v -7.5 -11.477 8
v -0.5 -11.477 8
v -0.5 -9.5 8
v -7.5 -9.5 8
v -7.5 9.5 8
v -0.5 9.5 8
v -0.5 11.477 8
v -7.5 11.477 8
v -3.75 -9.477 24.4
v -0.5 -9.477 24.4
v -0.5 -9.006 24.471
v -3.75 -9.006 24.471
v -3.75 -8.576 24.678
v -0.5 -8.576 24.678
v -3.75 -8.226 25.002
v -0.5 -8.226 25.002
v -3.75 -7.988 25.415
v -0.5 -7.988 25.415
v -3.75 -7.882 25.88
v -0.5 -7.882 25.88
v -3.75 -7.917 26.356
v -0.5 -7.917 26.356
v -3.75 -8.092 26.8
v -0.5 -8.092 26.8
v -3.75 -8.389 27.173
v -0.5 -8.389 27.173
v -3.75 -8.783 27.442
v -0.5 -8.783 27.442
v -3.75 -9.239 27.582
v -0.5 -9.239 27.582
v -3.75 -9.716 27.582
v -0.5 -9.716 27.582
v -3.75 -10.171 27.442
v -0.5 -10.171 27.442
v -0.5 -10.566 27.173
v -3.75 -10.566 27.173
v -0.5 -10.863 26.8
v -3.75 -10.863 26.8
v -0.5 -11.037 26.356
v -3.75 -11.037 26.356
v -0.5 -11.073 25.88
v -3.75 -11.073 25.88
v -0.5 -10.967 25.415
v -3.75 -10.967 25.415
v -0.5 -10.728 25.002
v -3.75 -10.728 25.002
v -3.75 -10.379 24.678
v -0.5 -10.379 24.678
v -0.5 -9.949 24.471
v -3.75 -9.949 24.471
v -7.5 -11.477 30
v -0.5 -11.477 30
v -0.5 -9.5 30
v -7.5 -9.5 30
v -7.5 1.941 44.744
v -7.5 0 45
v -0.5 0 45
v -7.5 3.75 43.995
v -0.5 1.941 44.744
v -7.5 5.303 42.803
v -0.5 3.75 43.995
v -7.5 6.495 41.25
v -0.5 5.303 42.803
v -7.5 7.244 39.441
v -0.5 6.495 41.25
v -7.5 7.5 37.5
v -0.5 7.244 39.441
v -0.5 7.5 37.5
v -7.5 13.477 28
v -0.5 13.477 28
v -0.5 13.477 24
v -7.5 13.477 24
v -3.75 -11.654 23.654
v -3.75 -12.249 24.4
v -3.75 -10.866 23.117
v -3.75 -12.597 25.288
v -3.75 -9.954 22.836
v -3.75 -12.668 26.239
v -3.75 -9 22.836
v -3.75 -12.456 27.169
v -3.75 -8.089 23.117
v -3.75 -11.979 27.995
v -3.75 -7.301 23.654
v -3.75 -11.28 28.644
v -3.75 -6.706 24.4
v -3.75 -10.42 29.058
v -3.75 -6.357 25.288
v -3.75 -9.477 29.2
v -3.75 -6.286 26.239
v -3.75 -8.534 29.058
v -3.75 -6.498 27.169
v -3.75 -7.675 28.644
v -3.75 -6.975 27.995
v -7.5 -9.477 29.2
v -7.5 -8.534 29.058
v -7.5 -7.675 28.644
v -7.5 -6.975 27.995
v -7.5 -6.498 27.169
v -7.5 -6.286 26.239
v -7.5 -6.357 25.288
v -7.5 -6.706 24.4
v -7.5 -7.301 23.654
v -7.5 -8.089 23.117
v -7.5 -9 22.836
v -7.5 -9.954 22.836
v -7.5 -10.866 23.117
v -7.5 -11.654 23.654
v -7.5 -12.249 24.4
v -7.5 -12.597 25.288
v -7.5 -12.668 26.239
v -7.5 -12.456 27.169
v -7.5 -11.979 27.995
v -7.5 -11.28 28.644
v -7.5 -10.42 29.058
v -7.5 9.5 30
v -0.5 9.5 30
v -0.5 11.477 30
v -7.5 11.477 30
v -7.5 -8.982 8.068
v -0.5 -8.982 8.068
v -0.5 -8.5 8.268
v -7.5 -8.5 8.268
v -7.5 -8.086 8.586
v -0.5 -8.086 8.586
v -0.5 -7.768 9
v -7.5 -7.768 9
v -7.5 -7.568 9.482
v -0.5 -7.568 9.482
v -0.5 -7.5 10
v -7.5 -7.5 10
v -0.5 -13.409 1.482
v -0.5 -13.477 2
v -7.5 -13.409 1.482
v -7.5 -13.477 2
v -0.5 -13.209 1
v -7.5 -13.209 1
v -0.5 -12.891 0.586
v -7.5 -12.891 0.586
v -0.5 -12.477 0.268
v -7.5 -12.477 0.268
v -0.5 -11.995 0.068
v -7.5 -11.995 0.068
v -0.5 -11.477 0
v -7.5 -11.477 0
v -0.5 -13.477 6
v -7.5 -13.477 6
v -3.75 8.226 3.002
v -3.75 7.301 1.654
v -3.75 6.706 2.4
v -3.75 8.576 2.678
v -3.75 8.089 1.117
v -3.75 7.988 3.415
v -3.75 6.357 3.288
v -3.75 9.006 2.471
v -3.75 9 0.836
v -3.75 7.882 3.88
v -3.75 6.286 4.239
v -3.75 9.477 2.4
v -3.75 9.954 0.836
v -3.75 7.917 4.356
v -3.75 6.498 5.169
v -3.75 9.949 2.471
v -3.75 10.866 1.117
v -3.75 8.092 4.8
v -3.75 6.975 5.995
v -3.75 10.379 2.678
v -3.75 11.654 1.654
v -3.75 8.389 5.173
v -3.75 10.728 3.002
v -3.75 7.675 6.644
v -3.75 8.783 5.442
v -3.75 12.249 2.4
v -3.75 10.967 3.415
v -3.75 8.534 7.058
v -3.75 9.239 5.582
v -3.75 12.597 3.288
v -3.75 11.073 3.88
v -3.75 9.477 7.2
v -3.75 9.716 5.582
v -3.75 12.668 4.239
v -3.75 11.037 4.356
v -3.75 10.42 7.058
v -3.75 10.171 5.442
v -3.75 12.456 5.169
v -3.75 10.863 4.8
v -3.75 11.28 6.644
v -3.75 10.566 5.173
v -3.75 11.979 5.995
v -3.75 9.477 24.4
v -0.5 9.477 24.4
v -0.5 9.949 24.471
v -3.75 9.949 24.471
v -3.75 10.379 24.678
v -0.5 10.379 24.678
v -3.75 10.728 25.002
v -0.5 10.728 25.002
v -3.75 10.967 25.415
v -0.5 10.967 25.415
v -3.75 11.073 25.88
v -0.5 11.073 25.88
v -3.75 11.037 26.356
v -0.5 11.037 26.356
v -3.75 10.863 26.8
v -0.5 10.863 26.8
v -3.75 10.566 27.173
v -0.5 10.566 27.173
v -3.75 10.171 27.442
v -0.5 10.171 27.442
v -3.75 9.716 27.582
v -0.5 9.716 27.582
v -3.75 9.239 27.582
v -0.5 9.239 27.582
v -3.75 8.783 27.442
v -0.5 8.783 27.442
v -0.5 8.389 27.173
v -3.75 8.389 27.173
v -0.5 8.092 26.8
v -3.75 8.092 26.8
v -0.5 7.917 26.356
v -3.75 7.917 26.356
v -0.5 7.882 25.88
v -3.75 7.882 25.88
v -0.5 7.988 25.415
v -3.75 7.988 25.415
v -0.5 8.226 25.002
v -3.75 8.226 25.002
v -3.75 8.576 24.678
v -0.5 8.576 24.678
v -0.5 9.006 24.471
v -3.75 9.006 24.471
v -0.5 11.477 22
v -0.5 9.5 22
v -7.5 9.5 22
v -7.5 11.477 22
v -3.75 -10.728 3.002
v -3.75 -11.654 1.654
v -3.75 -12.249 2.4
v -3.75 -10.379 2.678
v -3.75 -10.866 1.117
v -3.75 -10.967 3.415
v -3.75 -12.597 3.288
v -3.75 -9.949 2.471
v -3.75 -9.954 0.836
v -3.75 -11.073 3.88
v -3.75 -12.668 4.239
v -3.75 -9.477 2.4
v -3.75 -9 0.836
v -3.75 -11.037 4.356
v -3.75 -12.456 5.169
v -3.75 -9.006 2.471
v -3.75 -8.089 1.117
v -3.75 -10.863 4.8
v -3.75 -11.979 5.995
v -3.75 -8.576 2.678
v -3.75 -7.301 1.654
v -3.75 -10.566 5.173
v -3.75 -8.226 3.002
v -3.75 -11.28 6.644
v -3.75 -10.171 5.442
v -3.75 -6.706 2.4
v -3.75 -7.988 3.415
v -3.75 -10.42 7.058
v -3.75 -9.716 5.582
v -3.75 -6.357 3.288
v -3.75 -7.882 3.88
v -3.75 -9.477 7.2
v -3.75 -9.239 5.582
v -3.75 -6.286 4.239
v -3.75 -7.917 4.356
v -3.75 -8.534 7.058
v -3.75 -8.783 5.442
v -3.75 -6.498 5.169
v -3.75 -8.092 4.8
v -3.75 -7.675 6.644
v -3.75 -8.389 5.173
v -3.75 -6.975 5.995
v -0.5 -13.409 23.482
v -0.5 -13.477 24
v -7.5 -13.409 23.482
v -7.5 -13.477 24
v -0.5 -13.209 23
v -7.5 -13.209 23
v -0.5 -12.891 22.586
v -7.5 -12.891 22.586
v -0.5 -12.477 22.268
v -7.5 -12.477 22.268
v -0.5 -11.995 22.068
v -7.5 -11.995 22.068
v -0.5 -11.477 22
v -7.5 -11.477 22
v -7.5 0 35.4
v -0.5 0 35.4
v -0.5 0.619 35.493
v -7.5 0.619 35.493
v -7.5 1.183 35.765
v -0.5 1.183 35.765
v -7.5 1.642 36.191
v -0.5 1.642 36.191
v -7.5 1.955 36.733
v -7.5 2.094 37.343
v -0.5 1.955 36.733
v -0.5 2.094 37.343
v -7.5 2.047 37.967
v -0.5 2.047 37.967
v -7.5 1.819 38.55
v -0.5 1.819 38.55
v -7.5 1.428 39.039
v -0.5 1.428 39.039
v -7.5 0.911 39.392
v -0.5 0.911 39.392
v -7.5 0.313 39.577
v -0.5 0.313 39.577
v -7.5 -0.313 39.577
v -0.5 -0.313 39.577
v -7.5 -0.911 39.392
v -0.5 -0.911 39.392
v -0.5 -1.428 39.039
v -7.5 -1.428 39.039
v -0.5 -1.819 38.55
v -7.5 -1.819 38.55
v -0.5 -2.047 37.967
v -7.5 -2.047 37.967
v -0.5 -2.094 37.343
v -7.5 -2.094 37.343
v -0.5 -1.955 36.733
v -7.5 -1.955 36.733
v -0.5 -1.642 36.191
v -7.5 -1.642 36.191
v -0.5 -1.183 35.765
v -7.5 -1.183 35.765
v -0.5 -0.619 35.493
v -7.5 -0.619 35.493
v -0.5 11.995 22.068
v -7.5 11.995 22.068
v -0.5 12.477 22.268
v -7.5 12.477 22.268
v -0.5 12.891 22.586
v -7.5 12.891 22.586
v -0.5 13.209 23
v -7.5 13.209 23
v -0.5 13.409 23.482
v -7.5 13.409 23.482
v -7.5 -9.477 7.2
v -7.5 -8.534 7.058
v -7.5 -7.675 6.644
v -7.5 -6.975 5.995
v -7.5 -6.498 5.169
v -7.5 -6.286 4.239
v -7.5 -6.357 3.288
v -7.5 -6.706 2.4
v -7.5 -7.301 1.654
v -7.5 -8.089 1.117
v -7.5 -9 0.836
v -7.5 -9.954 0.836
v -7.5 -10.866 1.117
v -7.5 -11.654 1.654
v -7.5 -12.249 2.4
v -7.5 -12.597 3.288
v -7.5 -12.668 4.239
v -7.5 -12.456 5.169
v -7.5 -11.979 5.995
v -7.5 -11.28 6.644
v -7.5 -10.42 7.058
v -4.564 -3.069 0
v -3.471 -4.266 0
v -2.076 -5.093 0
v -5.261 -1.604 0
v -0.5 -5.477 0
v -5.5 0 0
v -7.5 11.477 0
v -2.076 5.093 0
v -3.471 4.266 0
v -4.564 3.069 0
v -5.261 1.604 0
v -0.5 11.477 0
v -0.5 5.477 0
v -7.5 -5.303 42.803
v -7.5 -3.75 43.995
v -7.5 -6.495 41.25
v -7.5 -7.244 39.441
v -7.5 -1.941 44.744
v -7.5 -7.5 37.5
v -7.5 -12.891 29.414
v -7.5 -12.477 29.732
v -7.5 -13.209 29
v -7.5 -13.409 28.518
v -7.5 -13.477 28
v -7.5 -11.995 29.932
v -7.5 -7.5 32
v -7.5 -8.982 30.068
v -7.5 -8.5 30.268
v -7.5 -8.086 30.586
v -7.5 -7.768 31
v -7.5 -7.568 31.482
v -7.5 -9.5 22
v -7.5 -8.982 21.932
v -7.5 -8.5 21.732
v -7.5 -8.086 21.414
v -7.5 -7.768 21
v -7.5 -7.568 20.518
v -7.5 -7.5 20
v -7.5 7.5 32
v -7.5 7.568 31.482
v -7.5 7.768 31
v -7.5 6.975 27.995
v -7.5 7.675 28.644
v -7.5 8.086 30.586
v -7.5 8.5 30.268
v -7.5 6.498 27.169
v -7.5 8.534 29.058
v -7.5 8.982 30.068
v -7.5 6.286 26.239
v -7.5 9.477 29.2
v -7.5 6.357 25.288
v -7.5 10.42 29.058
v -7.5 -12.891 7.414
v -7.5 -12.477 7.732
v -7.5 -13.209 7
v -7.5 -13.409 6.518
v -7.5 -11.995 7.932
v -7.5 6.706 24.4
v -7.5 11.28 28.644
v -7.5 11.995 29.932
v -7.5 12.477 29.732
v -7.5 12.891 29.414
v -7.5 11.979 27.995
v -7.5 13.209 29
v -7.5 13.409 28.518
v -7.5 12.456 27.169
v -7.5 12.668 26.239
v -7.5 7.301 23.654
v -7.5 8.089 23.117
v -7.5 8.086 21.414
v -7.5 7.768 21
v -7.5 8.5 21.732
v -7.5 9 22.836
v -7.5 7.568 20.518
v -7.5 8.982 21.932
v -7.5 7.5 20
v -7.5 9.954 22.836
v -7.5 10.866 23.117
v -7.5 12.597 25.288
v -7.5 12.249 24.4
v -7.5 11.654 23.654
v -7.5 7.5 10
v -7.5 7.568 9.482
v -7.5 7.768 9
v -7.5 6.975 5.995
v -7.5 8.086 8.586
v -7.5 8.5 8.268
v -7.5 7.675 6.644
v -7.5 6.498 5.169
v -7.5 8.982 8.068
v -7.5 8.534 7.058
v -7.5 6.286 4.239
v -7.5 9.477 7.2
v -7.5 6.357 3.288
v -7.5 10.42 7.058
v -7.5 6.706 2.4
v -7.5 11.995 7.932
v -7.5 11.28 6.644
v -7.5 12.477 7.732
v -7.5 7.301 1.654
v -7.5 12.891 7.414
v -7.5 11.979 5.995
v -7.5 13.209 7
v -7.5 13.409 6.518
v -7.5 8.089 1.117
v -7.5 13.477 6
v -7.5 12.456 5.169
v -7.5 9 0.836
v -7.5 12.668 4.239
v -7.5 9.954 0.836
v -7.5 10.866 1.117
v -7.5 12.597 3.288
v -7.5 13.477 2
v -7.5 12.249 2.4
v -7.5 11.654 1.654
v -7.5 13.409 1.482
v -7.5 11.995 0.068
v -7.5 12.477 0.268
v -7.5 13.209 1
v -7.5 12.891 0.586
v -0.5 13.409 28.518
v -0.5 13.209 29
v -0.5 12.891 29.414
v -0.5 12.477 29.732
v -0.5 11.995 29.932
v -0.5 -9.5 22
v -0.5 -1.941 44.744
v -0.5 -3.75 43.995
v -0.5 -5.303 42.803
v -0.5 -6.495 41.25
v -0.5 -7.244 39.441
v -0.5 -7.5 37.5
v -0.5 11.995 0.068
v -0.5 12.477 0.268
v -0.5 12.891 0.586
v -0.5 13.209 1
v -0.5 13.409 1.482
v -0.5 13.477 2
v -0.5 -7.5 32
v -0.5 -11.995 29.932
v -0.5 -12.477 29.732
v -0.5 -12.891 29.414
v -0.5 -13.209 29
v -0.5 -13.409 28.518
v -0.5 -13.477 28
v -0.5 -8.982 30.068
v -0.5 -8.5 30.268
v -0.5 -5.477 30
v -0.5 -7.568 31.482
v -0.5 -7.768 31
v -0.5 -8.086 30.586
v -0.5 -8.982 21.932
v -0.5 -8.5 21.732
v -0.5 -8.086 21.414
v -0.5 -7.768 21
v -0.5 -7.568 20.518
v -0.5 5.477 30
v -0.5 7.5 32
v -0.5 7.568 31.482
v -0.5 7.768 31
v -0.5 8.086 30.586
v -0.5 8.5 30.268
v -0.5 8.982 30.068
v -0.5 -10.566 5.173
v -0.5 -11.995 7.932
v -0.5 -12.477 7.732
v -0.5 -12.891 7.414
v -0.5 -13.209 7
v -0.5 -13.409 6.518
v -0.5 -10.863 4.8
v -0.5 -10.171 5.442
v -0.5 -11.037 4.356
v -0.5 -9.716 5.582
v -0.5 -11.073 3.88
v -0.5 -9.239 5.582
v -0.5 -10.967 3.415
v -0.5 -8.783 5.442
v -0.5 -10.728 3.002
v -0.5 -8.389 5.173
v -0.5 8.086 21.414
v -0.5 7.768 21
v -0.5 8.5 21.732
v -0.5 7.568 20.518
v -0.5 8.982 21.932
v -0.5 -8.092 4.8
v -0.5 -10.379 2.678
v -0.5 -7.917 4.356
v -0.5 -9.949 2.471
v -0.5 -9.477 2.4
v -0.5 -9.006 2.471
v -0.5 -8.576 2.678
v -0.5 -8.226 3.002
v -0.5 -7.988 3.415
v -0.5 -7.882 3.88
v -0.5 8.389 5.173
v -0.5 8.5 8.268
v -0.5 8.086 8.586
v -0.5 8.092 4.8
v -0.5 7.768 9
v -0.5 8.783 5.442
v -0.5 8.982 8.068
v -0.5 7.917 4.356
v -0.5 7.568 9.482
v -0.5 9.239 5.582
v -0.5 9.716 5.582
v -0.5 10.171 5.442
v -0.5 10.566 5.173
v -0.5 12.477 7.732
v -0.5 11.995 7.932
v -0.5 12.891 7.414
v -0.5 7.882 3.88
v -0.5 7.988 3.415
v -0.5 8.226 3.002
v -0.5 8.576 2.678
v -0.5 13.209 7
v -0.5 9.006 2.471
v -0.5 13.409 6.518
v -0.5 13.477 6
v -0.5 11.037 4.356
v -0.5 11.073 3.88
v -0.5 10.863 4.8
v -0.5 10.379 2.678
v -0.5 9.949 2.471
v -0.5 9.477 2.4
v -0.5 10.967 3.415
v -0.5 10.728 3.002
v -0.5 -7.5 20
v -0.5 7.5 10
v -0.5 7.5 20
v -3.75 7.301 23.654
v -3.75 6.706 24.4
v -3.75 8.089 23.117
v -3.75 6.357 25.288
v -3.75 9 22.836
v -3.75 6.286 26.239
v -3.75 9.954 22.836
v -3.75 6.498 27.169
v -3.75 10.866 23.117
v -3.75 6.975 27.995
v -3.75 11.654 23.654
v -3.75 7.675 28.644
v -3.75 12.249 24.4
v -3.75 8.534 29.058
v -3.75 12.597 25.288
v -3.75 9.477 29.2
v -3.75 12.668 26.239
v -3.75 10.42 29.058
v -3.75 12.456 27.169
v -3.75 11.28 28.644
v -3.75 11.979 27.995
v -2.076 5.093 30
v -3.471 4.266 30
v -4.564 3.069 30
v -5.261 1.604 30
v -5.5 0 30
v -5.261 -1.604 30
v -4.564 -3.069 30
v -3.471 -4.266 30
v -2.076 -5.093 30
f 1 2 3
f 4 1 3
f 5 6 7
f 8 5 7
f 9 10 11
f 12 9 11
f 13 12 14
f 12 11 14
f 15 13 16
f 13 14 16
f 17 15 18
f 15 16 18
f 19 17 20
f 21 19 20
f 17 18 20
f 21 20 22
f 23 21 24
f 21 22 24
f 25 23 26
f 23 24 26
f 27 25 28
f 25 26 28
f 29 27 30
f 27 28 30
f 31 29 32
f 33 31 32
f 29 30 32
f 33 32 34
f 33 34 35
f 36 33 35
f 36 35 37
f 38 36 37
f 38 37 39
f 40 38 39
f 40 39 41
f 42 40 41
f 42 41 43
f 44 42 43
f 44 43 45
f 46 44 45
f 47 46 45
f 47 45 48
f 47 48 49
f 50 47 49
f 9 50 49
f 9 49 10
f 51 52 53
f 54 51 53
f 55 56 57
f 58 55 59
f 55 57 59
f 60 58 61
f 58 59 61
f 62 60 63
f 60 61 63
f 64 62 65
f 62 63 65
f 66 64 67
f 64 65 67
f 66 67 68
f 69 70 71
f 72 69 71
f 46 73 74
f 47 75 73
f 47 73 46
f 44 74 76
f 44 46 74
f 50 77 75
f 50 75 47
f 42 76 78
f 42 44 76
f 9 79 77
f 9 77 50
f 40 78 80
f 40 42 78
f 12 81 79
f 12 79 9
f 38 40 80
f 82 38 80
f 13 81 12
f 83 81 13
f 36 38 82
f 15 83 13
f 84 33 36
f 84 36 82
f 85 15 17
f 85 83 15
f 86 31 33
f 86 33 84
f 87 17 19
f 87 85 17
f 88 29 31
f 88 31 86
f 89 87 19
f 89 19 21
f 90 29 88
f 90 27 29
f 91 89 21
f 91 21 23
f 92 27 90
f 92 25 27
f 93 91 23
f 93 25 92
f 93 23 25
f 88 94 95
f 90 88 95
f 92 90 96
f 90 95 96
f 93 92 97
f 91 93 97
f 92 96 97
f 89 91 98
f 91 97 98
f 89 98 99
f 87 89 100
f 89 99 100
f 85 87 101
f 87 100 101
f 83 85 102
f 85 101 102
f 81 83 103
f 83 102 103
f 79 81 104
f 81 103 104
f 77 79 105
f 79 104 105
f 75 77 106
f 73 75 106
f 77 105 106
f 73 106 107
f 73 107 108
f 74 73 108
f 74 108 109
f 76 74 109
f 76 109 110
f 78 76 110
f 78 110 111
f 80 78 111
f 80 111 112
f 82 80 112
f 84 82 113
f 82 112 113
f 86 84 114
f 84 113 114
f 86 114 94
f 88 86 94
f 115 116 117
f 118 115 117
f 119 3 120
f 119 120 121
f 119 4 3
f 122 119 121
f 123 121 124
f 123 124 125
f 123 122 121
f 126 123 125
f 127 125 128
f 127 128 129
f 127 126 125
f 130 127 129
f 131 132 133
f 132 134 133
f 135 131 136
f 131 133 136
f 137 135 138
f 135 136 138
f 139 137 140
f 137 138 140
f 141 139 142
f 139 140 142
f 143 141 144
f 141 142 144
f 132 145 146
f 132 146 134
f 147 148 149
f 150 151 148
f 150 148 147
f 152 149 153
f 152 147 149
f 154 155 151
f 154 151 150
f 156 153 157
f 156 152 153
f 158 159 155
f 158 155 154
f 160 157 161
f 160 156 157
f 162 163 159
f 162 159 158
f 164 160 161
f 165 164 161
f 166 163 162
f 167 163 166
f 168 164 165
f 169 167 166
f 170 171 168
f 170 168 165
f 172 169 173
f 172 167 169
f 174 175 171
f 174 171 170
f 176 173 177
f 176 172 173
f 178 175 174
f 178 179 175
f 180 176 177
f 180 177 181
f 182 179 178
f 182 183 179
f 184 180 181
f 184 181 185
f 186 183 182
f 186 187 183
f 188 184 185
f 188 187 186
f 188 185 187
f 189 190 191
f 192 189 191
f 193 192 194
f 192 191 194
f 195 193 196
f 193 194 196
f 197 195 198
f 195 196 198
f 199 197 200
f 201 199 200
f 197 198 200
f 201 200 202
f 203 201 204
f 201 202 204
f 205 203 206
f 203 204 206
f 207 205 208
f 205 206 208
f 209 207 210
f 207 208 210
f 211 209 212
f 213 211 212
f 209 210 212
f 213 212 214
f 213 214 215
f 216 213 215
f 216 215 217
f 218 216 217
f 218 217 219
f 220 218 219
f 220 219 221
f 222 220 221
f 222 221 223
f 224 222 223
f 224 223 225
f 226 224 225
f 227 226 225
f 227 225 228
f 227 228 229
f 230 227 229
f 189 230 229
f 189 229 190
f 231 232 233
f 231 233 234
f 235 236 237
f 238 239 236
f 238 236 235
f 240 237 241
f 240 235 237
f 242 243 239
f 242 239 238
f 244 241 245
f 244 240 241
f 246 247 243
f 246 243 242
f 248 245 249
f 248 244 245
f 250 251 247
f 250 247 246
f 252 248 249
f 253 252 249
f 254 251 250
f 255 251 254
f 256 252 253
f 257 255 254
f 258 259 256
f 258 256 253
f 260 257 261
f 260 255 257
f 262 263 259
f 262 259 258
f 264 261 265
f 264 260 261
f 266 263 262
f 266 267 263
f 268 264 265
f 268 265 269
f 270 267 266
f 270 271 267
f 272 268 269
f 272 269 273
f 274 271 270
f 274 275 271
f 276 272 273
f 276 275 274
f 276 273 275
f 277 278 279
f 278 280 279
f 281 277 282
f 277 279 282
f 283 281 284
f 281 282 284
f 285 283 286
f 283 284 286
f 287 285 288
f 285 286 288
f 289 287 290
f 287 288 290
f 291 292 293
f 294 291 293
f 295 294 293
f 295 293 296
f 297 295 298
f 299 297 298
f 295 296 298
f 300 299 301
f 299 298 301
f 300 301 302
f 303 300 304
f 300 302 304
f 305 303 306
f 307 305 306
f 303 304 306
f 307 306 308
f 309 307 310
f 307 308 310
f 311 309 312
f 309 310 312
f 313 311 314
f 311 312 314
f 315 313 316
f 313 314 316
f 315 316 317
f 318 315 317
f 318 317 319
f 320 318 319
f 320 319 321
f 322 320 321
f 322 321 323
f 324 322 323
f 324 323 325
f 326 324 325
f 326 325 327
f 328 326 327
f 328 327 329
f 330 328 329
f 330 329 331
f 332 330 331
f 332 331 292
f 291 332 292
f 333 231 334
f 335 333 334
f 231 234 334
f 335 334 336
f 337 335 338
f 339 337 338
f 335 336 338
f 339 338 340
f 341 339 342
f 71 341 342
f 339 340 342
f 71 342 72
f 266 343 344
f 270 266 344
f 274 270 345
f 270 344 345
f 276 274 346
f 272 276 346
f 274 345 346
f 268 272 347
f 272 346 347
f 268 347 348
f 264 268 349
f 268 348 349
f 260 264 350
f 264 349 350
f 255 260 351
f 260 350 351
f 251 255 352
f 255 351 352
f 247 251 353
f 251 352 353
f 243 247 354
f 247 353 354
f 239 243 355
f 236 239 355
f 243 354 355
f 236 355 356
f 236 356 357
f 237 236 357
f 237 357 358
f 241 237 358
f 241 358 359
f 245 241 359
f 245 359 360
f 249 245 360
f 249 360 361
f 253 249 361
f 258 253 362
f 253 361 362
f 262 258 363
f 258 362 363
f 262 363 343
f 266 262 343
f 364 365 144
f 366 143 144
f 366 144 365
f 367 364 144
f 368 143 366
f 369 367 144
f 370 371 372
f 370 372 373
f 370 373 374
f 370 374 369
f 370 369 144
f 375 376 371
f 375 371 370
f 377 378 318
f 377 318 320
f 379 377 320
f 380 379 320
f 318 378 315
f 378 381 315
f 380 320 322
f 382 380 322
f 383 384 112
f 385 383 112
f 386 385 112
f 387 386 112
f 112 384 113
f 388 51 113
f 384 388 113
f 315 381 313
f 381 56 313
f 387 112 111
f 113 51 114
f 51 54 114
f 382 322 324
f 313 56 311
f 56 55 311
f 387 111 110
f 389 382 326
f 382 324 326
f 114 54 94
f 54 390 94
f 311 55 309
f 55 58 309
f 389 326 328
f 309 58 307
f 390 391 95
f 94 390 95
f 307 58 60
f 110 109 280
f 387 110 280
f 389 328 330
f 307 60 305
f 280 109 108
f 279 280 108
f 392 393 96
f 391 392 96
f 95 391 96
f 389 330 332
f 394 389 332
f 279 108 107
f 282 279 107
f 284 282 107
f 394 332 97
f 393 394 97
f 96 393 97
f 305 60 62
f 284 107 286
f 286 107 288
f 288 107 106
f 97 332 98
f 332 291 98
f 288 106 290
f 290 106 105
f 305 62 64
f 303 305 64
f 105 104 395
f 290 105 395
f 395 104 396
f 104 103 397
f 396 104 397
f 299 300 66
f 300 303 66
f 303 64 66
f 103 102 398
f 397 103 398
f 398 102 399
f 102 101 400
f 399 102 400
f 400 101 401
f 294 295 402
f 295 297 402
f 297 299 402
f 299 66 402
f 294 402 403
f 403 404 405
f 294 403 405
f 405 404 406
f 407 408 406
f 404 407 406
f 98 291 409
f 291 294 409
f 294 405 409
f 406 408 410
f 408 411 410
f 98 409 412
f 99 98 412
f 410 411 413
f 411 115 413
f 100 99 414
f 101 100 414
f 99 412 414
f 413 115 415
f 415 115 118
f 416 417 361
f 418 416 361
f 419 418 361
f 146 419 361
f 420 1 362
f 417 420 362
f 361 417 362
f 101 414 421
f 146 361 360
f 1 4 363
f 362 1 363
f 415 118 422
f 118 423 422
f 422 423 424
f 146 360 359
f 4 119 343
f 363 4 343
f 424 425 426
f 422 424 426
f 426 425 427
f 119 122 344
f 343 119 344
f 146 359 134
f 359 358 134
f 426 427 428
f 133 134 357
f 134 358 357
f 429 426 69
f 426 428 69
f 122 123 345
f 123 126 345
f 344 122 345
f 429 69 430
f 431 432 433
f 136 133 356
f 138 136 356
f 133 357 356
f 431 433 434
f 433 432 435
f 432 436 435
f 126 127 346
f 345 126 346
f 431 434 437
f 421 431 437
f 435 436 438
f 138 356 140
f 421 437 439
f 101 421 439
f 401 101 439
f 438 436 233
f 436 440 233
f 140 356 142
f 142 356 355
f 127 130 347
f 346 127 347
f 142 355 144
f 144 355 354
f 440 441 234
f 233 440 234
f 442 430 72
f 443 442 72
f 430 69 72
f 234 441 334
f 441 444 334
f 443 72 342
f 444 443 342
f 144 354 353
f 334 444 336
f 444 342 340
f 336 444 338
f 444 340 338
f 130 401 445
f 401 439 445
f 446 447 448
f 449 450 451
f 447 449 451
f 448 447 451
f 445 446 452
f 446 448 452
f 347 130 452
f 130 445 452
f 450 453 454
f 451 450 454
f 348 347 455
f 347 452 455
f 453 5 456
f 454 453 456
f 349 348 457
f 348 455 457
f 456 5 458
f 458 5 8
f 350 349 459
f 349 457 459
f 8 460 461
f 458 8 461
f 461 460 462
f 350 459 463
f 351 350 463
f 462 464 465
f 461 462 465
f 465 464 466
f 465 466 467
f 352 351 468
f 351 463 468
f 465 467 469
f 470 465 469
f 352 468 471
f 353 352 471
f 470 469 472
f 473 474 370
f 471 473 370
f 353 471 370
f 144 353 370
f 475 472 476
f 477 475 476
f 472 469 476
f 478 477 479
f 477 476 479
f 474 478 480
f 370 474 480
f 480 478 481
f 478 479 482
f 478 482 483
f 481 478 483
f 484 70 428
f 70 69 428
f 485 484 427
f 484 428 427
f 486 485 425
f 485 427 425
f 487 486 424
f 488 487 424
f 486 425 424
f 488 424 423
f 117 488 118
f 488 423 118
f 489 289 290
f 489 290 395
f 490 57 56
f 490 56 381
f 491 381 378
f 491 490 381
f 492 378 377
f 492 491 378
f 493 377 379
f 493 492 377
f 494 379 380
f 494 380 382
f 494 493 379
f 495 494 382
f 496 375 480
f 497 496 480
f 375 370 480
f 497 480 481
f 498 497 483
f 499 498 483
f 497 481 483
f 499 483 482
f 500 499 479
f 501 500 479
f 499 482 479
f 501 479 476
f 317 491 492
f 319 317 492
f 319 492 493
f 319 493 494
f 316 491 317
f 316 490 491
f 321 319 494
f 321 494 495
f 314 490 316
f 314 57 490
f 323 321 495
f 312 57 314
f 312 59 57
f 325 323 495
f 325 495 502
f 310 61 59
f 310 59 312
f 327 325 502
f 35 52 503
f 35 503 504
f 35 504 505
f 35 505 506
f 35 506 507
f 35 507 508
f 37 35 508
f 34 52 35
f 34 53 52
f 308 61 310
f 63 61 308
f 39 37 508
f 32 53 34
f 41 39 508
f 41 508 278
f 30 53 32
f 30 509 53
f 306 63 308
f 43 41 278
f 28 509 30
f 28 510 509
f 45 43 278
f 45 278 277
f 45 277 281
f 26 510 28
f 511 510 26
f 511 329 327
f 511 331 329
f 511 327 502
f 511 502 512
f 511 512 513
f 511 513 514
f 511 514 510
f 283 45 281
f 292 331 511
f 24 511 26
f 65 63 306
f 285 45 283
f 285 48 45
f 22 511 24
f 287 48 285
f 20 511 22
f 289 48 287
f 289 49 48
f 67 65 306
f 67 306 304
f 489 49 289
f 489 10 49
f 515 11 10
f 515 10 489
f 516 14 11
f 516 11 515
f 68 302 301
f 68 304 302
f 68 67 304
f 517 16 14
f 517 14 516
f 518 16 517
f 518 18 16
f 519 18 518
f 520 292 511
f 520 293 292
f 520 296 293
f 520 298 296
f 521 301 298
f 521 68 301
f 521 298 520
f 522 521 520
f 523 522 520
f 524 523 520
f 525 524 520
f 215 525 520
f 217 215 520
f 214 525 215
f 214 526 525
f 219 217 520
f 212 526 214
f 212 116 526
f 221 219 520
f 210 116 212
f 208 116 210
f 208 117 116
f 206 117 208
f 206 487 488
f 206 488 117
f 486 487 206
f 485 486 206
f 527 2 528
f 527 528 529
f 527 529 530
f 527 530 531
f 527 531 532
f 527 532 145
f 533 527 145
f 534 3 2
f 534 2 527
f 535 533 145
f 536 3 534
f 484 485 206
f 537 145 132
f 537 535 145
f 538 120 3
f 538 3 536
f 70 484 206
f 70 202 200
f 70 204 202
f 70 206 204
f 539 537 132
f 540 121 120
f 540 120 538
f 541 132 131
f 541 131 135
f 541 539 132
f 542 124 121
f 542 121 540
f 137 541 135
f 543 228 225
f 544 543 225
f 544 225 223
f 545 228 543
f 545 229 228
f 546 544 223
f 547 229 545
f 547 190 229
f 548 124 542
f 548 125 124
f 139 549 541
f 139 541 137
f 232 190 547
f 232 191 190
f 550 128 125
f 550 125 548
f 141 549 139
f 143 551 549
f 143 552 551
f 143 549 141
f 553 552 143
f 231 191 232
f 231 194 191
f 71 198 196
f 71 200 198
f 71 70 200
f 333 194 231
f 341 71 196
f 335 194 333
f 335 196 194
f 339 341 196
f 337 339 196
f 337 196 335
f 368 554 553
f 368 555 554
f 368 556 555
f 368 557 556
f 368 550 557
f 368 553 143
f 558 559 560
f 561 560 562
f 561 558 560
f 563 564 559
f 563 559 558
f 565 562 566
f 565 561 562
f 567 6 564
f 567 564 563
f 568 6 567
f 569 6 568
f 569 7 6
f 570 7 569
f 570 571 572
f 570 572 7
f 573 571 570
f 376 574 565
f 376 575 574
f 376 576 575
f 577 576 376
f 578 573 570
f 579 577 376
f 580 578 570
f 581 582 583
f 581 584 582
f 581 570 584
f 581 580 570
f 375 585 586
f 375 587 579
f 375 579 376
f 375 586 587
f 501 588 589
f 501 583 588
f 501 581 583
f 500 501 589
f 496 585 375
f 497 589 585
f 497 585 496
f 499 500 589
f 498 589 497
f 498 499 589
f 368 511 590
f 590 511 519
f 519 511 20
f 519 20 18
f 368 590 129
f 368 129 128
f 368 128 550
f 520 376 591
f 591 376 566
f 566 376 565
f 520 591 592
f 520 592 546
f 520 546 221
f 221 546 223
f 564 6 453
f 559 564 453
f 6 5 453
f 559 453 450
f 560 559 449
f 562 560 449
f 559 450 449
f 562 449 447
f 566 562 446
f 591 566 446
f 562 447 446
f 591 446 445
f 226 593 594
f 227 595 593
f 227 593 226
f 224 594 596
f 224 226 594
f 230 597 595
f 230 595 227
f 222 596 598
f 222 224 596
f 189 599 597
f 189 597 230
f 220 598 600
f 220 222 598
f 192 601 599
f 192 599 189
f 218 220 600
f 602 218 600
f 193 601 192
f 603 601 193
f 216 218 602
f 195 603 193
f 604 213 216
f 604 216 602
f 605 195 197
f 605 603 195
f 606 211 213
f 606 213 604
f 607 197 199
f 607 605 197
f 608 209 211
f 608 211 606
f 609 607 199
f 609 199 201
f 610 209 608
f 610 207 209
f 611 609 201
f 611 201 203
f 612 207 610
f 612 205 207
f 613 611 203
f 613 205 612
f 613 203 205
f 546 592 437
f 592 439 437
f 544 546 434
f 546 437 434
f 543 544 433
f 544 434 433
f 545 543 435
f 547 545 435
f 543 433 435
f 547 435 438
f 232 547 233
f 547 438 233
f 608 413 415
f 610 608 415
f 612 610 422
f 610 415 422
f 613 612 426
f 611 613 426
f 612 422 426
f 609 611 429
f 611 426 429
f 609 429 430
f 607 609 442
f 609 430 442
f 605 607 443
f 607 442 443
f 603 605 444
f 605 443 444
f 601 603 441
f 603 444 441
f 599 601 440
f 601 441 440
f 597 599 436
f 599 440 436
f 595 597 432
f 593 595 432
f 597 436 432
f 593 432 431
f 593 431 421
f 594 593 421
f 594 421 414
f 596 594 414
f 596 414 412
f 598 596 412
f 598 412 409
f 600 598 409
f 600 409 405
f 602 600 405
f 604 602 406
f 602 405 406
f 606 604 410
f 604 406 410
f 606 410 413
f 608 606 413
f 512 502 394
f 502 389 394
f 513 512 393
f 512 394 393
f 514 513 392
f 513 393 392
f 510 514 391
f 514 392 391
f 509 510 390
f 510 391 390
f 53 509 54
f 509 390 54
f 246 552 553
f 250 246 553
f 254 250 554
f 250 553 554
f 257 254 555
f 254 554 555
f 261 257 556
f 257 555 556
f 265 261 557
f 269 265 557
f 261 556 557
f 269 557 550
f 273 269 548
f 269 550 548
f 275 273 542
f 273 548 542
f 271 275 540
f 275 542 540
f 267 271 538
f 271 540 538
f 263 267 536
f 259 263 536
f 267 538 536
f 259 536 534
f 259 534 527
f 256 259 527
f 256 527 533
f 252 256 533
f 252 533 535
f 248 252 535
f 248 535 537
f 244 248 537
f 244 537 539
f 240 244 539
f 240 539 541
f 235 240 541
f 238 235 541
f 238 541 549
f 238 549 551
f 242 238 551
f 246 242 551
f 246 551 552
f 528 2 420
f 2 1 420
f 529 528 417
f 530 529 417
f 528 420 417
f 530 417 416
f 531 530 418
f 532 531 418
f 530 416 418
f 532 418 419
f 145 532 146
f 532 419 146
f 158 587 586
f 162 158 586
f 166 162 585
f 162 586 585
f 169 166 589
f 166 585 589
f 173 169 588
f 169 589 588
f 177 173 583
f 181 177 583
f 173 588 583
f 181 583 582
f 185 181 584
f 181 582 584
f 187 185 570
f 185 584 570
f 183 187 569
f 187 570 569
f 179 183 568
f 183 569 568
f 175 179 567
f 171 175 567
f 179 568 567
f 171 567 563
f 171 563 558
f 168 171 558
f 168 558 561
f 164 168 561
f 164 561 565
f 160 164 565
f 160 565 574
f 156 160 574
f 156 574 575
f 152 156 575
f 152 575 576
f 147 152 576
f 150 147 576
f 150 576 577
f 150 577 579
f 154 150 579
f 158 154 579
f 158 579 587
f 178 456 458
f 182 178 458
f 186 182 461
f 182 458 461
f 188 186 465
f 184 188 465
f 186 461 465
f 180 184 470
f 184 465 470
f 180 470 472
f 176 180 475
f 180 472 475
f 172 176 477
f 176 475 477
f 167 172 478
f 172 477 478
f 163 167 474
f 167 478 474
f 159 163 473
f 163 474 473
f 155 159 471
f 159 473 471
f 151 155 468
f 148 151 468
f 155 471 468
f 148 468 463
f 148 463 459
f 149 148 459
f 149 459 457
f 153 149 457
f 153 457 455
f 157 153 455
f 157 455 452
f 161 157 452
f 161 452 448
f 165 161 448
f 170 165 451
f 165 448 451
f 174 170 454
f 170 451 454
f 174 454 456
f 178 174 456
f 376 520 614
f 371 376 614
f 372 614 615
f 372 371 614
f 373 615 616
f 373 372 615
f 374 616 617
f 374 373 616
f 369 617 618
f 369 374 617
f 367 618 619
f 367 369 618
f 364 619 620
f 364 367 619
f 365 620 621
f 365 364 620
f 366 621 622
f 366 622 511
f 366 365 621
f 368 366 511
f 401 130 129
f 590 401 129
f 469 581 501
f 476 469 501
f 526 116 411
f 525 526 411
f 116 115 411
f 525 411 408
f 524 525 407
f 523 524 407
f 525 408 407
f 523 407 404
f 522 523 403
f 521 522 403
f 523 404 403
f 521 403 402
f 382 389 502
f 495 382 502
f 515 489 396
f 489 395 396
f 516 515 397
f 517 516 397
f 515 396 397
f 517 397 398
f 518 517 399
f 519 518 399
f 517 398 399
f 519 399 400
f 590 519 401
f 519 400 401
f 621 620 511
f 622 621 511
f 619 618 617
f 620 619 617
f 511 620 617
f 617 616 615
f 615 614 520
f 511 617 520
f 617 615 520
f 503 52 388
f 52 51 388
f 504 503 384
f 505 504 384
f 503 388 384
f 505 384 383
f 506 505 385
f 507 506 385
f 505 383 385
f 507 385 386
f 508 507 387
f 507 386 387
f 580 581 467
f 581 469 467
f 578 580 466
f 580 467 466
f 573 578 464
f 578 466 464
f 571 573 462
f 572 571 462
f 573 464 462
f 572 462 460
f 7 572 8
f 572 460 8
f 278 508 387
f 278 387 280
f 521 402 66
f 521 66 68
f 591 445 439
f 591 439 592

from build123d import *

# Parameters (mm, degrees)
SKETCH_1_W          = 15
SKETCH_1_H          = 15
SKETCH_1_R          = 5.5
EXTRUDE_1_DEPTH     = 45
SKETCH_5_W          = 15
SKETCH_5_H          = 15
EXTRUDE_3_DEPTH     = 15
FILLET_2_R          = 7.5
SKETCH_6_R          = 2.1
CUT_EXTRUDE_1_DEPTH = 49.023431781
CUT_EXTRUDE_2_DEPTH = 8
SKETCH_9_W          = 8
SKETCH_9_H          = 8
SKETCH_9_R          = 1.6
EXTRUDE_4_DEPTH     = 7
FILLET_3_R          = 2
SKETCH_11_R         = 3.2
CUT_EXTRUDE_3_DEPTH = 3.75


with BuildPart() as part:
    # ｽｹｯﾁ1 → ﾎﾞｽ - 押し出し1 (new body)
    with BuildSketch(Plane.XY):
        Rectangle(SKETCH_1_W, SKETCH_1_H)
        with Locations(Location((0, 0, 0), (0, 0, 180))):
            Circle(SKETCH_1_R, mode=Mode.SUBTRACT)
    extrude(amount=EXTRUDE_1_DEPTH)

    # ｽｹｯﾁ5 → ﾎﾞｽ - 押し出し3 (add)
    with BuildSketch(Plane.XY.offset(45)):
        Rectangle(SKETCH_5_W, SKETCH_5_H)
    extrude(amount=-EXTRUDE_3_DEPTH)

    # ﾌｨﾚｯﾄ2
    fillet_2_edges = [part.edges().sort_by_distance(p)[0] for p in [
        (0, -7.5, 45),
        (0, 7.5, 45),
    ]]
    fillet(fillet_2_edges, radius=FILLET_2_R - 0.0001)  # a hair under: the kernel refuses the full size

    # ｽｹｯﾁ6 → ｶｯﾄ - 押し出し1 (cut, through all)
    with BuildSketch(Plane(origin=(7.5, 0, 0), x_dir=(0, 0, -1), z_dir=(1, 0, 0))):
        with Locations((-37.5, 0)):
            Circle(SKETCH_6_R)
    extrude(amount=-CUT_EXTRUDE_1_DEPTH, mode=Mode.SUBTRACT)

    # ｽｹｯﾁ7 → ｶｯﾄ - 押し出し2 (cut)
    with BuildSketch(Plane(origin=(7.5, 0, 0), x_dir=(0, 0, -1), z_dir=(1, 0, 0))):
        with BuildLine():
            Line((-37.5, -9.5), (2, -9.5))
            Line((2, -9.5), (2, 9.5))
            Line((2, 9.5), (-37.5, 9.5))
            ThreePointArc((-37.5, 9.5), (-44.217514421, 6.717514421), (-47, 0))
            ThreePointArc((-47, 0), (-44.217514421, -6.717514421), (-37.5, -9.5))
        make_face()
    extrude(amount=-CUT_EXTRUDE_2_DEPTH, mode=Mode.SUBTRACT)

    # ｽｹｯﾁ9 → ﾎﾞｽ - 押し出し4 (add)
    # profile 1 of 4: a face of its own
    with BuildSketch(Plane(origin=(-0.5, 0, 0), x_dir=(0, 0, -1), z_dir=(1, 0, 0))):
        with Locations((-4, -9.477225575)):
            Rectangle(SKETCH_9_W, SKETCH_9_H)
        with Locations((-4, -9.477225575)):
            Circle(SKETCH_9_R, mode=Mode.SUBTRACT)
    # profile 2 of 4: a face of its own
    with BuildSketch(Plane(origin=(-0.5, 0, 0), x_dir=(0, 0, -1), z_dir=(1, 0, 0))):
        with Locations((-26, 9.477225575)):
            Rectangle(SKETCH_9_W, SKETCH_9_H)
        with Locations((-26, 9.477225575)):
            Circle(SKETCH_9_R, mode=Mode.SUBTRACT)
    # profile 3 of 4: a face of its own
    with BuildSketch(Plane(origin=(-0.5, 0, 0), x_dir=(0, 0, -1), z_dir=(1, 0, 0))):
        with Locations((-4, 9.477225575)):
            Rectangle(SKETCH_9_W, SKETCH_9_H)
        with Locations((-4, 9.477225575)):
            Circle(SKETCH_9_R, mode=Mode.SUBTRACT)
    # profile 4 of 4: a face of its own
    with BuildSketch(Plane(origin=(-0.5, 0, 0), x_dir=(0, 0, -1), z_dir=(1, 0, 0))):
        with Locations((-26, -9.477225575)):
            Rectangle(SKETCH_9_W, SKETCH_9_H)
        with Locations((-26, -9.477225575)):
            Circle(SKETCH_9_R, mode=Mode.SUBTRACT)
    extrude(amount=-EXTRUDE_4_DEPTH)

    # ﾌｨﾚｯﾄ3
    fillet_3_edges = [part.edges().sort_by_distance(p)[0] for p in [
        (-4, 13.477225575, 22),
        (-4, 7.5, 30),
        (-4, 13.477225575, 30),
        (-4, 7.5, 22),
        (-4, 13.477225575, 0),
        (-4, 7.5, 8),
        (-4, 13.477225575, 8),
        (-4, -13.477225575, 30),
        (-4, -7.5, 22),
        (-4, -13.477225575, 22),
        (-4, -7.5, 30),
        (-4, -13.477225575, 8),
        (-4, -13.477225575, 0),
        (-4, -7.5, 8),
    ]]
    fillet(fillet_3_edges, radius=FILLET_3_R)

    # ｽｹｯﾁ11 → ｶｯﾄ - 押し出し3 (cut)
    with BuildSketch(Plane.ZY.offset(7.5)):
        with Locations((4, 9.477225575)):
            Circle(SKETCH_11_R)
        with Locations((26, 9.477225575)):
            Circle(SKETCH_11_R)
        with Locations((26, -9.477225575)):
            Circle(SKETCH_11_R)
        with Locations((4, -9.477225575)):
            Circle(SKETCH_11_R)
    extrude(amount=-CUT_EXTRUDE_3_DEPTH, mode=Mode.SUBTRACT)


solid = part.part
